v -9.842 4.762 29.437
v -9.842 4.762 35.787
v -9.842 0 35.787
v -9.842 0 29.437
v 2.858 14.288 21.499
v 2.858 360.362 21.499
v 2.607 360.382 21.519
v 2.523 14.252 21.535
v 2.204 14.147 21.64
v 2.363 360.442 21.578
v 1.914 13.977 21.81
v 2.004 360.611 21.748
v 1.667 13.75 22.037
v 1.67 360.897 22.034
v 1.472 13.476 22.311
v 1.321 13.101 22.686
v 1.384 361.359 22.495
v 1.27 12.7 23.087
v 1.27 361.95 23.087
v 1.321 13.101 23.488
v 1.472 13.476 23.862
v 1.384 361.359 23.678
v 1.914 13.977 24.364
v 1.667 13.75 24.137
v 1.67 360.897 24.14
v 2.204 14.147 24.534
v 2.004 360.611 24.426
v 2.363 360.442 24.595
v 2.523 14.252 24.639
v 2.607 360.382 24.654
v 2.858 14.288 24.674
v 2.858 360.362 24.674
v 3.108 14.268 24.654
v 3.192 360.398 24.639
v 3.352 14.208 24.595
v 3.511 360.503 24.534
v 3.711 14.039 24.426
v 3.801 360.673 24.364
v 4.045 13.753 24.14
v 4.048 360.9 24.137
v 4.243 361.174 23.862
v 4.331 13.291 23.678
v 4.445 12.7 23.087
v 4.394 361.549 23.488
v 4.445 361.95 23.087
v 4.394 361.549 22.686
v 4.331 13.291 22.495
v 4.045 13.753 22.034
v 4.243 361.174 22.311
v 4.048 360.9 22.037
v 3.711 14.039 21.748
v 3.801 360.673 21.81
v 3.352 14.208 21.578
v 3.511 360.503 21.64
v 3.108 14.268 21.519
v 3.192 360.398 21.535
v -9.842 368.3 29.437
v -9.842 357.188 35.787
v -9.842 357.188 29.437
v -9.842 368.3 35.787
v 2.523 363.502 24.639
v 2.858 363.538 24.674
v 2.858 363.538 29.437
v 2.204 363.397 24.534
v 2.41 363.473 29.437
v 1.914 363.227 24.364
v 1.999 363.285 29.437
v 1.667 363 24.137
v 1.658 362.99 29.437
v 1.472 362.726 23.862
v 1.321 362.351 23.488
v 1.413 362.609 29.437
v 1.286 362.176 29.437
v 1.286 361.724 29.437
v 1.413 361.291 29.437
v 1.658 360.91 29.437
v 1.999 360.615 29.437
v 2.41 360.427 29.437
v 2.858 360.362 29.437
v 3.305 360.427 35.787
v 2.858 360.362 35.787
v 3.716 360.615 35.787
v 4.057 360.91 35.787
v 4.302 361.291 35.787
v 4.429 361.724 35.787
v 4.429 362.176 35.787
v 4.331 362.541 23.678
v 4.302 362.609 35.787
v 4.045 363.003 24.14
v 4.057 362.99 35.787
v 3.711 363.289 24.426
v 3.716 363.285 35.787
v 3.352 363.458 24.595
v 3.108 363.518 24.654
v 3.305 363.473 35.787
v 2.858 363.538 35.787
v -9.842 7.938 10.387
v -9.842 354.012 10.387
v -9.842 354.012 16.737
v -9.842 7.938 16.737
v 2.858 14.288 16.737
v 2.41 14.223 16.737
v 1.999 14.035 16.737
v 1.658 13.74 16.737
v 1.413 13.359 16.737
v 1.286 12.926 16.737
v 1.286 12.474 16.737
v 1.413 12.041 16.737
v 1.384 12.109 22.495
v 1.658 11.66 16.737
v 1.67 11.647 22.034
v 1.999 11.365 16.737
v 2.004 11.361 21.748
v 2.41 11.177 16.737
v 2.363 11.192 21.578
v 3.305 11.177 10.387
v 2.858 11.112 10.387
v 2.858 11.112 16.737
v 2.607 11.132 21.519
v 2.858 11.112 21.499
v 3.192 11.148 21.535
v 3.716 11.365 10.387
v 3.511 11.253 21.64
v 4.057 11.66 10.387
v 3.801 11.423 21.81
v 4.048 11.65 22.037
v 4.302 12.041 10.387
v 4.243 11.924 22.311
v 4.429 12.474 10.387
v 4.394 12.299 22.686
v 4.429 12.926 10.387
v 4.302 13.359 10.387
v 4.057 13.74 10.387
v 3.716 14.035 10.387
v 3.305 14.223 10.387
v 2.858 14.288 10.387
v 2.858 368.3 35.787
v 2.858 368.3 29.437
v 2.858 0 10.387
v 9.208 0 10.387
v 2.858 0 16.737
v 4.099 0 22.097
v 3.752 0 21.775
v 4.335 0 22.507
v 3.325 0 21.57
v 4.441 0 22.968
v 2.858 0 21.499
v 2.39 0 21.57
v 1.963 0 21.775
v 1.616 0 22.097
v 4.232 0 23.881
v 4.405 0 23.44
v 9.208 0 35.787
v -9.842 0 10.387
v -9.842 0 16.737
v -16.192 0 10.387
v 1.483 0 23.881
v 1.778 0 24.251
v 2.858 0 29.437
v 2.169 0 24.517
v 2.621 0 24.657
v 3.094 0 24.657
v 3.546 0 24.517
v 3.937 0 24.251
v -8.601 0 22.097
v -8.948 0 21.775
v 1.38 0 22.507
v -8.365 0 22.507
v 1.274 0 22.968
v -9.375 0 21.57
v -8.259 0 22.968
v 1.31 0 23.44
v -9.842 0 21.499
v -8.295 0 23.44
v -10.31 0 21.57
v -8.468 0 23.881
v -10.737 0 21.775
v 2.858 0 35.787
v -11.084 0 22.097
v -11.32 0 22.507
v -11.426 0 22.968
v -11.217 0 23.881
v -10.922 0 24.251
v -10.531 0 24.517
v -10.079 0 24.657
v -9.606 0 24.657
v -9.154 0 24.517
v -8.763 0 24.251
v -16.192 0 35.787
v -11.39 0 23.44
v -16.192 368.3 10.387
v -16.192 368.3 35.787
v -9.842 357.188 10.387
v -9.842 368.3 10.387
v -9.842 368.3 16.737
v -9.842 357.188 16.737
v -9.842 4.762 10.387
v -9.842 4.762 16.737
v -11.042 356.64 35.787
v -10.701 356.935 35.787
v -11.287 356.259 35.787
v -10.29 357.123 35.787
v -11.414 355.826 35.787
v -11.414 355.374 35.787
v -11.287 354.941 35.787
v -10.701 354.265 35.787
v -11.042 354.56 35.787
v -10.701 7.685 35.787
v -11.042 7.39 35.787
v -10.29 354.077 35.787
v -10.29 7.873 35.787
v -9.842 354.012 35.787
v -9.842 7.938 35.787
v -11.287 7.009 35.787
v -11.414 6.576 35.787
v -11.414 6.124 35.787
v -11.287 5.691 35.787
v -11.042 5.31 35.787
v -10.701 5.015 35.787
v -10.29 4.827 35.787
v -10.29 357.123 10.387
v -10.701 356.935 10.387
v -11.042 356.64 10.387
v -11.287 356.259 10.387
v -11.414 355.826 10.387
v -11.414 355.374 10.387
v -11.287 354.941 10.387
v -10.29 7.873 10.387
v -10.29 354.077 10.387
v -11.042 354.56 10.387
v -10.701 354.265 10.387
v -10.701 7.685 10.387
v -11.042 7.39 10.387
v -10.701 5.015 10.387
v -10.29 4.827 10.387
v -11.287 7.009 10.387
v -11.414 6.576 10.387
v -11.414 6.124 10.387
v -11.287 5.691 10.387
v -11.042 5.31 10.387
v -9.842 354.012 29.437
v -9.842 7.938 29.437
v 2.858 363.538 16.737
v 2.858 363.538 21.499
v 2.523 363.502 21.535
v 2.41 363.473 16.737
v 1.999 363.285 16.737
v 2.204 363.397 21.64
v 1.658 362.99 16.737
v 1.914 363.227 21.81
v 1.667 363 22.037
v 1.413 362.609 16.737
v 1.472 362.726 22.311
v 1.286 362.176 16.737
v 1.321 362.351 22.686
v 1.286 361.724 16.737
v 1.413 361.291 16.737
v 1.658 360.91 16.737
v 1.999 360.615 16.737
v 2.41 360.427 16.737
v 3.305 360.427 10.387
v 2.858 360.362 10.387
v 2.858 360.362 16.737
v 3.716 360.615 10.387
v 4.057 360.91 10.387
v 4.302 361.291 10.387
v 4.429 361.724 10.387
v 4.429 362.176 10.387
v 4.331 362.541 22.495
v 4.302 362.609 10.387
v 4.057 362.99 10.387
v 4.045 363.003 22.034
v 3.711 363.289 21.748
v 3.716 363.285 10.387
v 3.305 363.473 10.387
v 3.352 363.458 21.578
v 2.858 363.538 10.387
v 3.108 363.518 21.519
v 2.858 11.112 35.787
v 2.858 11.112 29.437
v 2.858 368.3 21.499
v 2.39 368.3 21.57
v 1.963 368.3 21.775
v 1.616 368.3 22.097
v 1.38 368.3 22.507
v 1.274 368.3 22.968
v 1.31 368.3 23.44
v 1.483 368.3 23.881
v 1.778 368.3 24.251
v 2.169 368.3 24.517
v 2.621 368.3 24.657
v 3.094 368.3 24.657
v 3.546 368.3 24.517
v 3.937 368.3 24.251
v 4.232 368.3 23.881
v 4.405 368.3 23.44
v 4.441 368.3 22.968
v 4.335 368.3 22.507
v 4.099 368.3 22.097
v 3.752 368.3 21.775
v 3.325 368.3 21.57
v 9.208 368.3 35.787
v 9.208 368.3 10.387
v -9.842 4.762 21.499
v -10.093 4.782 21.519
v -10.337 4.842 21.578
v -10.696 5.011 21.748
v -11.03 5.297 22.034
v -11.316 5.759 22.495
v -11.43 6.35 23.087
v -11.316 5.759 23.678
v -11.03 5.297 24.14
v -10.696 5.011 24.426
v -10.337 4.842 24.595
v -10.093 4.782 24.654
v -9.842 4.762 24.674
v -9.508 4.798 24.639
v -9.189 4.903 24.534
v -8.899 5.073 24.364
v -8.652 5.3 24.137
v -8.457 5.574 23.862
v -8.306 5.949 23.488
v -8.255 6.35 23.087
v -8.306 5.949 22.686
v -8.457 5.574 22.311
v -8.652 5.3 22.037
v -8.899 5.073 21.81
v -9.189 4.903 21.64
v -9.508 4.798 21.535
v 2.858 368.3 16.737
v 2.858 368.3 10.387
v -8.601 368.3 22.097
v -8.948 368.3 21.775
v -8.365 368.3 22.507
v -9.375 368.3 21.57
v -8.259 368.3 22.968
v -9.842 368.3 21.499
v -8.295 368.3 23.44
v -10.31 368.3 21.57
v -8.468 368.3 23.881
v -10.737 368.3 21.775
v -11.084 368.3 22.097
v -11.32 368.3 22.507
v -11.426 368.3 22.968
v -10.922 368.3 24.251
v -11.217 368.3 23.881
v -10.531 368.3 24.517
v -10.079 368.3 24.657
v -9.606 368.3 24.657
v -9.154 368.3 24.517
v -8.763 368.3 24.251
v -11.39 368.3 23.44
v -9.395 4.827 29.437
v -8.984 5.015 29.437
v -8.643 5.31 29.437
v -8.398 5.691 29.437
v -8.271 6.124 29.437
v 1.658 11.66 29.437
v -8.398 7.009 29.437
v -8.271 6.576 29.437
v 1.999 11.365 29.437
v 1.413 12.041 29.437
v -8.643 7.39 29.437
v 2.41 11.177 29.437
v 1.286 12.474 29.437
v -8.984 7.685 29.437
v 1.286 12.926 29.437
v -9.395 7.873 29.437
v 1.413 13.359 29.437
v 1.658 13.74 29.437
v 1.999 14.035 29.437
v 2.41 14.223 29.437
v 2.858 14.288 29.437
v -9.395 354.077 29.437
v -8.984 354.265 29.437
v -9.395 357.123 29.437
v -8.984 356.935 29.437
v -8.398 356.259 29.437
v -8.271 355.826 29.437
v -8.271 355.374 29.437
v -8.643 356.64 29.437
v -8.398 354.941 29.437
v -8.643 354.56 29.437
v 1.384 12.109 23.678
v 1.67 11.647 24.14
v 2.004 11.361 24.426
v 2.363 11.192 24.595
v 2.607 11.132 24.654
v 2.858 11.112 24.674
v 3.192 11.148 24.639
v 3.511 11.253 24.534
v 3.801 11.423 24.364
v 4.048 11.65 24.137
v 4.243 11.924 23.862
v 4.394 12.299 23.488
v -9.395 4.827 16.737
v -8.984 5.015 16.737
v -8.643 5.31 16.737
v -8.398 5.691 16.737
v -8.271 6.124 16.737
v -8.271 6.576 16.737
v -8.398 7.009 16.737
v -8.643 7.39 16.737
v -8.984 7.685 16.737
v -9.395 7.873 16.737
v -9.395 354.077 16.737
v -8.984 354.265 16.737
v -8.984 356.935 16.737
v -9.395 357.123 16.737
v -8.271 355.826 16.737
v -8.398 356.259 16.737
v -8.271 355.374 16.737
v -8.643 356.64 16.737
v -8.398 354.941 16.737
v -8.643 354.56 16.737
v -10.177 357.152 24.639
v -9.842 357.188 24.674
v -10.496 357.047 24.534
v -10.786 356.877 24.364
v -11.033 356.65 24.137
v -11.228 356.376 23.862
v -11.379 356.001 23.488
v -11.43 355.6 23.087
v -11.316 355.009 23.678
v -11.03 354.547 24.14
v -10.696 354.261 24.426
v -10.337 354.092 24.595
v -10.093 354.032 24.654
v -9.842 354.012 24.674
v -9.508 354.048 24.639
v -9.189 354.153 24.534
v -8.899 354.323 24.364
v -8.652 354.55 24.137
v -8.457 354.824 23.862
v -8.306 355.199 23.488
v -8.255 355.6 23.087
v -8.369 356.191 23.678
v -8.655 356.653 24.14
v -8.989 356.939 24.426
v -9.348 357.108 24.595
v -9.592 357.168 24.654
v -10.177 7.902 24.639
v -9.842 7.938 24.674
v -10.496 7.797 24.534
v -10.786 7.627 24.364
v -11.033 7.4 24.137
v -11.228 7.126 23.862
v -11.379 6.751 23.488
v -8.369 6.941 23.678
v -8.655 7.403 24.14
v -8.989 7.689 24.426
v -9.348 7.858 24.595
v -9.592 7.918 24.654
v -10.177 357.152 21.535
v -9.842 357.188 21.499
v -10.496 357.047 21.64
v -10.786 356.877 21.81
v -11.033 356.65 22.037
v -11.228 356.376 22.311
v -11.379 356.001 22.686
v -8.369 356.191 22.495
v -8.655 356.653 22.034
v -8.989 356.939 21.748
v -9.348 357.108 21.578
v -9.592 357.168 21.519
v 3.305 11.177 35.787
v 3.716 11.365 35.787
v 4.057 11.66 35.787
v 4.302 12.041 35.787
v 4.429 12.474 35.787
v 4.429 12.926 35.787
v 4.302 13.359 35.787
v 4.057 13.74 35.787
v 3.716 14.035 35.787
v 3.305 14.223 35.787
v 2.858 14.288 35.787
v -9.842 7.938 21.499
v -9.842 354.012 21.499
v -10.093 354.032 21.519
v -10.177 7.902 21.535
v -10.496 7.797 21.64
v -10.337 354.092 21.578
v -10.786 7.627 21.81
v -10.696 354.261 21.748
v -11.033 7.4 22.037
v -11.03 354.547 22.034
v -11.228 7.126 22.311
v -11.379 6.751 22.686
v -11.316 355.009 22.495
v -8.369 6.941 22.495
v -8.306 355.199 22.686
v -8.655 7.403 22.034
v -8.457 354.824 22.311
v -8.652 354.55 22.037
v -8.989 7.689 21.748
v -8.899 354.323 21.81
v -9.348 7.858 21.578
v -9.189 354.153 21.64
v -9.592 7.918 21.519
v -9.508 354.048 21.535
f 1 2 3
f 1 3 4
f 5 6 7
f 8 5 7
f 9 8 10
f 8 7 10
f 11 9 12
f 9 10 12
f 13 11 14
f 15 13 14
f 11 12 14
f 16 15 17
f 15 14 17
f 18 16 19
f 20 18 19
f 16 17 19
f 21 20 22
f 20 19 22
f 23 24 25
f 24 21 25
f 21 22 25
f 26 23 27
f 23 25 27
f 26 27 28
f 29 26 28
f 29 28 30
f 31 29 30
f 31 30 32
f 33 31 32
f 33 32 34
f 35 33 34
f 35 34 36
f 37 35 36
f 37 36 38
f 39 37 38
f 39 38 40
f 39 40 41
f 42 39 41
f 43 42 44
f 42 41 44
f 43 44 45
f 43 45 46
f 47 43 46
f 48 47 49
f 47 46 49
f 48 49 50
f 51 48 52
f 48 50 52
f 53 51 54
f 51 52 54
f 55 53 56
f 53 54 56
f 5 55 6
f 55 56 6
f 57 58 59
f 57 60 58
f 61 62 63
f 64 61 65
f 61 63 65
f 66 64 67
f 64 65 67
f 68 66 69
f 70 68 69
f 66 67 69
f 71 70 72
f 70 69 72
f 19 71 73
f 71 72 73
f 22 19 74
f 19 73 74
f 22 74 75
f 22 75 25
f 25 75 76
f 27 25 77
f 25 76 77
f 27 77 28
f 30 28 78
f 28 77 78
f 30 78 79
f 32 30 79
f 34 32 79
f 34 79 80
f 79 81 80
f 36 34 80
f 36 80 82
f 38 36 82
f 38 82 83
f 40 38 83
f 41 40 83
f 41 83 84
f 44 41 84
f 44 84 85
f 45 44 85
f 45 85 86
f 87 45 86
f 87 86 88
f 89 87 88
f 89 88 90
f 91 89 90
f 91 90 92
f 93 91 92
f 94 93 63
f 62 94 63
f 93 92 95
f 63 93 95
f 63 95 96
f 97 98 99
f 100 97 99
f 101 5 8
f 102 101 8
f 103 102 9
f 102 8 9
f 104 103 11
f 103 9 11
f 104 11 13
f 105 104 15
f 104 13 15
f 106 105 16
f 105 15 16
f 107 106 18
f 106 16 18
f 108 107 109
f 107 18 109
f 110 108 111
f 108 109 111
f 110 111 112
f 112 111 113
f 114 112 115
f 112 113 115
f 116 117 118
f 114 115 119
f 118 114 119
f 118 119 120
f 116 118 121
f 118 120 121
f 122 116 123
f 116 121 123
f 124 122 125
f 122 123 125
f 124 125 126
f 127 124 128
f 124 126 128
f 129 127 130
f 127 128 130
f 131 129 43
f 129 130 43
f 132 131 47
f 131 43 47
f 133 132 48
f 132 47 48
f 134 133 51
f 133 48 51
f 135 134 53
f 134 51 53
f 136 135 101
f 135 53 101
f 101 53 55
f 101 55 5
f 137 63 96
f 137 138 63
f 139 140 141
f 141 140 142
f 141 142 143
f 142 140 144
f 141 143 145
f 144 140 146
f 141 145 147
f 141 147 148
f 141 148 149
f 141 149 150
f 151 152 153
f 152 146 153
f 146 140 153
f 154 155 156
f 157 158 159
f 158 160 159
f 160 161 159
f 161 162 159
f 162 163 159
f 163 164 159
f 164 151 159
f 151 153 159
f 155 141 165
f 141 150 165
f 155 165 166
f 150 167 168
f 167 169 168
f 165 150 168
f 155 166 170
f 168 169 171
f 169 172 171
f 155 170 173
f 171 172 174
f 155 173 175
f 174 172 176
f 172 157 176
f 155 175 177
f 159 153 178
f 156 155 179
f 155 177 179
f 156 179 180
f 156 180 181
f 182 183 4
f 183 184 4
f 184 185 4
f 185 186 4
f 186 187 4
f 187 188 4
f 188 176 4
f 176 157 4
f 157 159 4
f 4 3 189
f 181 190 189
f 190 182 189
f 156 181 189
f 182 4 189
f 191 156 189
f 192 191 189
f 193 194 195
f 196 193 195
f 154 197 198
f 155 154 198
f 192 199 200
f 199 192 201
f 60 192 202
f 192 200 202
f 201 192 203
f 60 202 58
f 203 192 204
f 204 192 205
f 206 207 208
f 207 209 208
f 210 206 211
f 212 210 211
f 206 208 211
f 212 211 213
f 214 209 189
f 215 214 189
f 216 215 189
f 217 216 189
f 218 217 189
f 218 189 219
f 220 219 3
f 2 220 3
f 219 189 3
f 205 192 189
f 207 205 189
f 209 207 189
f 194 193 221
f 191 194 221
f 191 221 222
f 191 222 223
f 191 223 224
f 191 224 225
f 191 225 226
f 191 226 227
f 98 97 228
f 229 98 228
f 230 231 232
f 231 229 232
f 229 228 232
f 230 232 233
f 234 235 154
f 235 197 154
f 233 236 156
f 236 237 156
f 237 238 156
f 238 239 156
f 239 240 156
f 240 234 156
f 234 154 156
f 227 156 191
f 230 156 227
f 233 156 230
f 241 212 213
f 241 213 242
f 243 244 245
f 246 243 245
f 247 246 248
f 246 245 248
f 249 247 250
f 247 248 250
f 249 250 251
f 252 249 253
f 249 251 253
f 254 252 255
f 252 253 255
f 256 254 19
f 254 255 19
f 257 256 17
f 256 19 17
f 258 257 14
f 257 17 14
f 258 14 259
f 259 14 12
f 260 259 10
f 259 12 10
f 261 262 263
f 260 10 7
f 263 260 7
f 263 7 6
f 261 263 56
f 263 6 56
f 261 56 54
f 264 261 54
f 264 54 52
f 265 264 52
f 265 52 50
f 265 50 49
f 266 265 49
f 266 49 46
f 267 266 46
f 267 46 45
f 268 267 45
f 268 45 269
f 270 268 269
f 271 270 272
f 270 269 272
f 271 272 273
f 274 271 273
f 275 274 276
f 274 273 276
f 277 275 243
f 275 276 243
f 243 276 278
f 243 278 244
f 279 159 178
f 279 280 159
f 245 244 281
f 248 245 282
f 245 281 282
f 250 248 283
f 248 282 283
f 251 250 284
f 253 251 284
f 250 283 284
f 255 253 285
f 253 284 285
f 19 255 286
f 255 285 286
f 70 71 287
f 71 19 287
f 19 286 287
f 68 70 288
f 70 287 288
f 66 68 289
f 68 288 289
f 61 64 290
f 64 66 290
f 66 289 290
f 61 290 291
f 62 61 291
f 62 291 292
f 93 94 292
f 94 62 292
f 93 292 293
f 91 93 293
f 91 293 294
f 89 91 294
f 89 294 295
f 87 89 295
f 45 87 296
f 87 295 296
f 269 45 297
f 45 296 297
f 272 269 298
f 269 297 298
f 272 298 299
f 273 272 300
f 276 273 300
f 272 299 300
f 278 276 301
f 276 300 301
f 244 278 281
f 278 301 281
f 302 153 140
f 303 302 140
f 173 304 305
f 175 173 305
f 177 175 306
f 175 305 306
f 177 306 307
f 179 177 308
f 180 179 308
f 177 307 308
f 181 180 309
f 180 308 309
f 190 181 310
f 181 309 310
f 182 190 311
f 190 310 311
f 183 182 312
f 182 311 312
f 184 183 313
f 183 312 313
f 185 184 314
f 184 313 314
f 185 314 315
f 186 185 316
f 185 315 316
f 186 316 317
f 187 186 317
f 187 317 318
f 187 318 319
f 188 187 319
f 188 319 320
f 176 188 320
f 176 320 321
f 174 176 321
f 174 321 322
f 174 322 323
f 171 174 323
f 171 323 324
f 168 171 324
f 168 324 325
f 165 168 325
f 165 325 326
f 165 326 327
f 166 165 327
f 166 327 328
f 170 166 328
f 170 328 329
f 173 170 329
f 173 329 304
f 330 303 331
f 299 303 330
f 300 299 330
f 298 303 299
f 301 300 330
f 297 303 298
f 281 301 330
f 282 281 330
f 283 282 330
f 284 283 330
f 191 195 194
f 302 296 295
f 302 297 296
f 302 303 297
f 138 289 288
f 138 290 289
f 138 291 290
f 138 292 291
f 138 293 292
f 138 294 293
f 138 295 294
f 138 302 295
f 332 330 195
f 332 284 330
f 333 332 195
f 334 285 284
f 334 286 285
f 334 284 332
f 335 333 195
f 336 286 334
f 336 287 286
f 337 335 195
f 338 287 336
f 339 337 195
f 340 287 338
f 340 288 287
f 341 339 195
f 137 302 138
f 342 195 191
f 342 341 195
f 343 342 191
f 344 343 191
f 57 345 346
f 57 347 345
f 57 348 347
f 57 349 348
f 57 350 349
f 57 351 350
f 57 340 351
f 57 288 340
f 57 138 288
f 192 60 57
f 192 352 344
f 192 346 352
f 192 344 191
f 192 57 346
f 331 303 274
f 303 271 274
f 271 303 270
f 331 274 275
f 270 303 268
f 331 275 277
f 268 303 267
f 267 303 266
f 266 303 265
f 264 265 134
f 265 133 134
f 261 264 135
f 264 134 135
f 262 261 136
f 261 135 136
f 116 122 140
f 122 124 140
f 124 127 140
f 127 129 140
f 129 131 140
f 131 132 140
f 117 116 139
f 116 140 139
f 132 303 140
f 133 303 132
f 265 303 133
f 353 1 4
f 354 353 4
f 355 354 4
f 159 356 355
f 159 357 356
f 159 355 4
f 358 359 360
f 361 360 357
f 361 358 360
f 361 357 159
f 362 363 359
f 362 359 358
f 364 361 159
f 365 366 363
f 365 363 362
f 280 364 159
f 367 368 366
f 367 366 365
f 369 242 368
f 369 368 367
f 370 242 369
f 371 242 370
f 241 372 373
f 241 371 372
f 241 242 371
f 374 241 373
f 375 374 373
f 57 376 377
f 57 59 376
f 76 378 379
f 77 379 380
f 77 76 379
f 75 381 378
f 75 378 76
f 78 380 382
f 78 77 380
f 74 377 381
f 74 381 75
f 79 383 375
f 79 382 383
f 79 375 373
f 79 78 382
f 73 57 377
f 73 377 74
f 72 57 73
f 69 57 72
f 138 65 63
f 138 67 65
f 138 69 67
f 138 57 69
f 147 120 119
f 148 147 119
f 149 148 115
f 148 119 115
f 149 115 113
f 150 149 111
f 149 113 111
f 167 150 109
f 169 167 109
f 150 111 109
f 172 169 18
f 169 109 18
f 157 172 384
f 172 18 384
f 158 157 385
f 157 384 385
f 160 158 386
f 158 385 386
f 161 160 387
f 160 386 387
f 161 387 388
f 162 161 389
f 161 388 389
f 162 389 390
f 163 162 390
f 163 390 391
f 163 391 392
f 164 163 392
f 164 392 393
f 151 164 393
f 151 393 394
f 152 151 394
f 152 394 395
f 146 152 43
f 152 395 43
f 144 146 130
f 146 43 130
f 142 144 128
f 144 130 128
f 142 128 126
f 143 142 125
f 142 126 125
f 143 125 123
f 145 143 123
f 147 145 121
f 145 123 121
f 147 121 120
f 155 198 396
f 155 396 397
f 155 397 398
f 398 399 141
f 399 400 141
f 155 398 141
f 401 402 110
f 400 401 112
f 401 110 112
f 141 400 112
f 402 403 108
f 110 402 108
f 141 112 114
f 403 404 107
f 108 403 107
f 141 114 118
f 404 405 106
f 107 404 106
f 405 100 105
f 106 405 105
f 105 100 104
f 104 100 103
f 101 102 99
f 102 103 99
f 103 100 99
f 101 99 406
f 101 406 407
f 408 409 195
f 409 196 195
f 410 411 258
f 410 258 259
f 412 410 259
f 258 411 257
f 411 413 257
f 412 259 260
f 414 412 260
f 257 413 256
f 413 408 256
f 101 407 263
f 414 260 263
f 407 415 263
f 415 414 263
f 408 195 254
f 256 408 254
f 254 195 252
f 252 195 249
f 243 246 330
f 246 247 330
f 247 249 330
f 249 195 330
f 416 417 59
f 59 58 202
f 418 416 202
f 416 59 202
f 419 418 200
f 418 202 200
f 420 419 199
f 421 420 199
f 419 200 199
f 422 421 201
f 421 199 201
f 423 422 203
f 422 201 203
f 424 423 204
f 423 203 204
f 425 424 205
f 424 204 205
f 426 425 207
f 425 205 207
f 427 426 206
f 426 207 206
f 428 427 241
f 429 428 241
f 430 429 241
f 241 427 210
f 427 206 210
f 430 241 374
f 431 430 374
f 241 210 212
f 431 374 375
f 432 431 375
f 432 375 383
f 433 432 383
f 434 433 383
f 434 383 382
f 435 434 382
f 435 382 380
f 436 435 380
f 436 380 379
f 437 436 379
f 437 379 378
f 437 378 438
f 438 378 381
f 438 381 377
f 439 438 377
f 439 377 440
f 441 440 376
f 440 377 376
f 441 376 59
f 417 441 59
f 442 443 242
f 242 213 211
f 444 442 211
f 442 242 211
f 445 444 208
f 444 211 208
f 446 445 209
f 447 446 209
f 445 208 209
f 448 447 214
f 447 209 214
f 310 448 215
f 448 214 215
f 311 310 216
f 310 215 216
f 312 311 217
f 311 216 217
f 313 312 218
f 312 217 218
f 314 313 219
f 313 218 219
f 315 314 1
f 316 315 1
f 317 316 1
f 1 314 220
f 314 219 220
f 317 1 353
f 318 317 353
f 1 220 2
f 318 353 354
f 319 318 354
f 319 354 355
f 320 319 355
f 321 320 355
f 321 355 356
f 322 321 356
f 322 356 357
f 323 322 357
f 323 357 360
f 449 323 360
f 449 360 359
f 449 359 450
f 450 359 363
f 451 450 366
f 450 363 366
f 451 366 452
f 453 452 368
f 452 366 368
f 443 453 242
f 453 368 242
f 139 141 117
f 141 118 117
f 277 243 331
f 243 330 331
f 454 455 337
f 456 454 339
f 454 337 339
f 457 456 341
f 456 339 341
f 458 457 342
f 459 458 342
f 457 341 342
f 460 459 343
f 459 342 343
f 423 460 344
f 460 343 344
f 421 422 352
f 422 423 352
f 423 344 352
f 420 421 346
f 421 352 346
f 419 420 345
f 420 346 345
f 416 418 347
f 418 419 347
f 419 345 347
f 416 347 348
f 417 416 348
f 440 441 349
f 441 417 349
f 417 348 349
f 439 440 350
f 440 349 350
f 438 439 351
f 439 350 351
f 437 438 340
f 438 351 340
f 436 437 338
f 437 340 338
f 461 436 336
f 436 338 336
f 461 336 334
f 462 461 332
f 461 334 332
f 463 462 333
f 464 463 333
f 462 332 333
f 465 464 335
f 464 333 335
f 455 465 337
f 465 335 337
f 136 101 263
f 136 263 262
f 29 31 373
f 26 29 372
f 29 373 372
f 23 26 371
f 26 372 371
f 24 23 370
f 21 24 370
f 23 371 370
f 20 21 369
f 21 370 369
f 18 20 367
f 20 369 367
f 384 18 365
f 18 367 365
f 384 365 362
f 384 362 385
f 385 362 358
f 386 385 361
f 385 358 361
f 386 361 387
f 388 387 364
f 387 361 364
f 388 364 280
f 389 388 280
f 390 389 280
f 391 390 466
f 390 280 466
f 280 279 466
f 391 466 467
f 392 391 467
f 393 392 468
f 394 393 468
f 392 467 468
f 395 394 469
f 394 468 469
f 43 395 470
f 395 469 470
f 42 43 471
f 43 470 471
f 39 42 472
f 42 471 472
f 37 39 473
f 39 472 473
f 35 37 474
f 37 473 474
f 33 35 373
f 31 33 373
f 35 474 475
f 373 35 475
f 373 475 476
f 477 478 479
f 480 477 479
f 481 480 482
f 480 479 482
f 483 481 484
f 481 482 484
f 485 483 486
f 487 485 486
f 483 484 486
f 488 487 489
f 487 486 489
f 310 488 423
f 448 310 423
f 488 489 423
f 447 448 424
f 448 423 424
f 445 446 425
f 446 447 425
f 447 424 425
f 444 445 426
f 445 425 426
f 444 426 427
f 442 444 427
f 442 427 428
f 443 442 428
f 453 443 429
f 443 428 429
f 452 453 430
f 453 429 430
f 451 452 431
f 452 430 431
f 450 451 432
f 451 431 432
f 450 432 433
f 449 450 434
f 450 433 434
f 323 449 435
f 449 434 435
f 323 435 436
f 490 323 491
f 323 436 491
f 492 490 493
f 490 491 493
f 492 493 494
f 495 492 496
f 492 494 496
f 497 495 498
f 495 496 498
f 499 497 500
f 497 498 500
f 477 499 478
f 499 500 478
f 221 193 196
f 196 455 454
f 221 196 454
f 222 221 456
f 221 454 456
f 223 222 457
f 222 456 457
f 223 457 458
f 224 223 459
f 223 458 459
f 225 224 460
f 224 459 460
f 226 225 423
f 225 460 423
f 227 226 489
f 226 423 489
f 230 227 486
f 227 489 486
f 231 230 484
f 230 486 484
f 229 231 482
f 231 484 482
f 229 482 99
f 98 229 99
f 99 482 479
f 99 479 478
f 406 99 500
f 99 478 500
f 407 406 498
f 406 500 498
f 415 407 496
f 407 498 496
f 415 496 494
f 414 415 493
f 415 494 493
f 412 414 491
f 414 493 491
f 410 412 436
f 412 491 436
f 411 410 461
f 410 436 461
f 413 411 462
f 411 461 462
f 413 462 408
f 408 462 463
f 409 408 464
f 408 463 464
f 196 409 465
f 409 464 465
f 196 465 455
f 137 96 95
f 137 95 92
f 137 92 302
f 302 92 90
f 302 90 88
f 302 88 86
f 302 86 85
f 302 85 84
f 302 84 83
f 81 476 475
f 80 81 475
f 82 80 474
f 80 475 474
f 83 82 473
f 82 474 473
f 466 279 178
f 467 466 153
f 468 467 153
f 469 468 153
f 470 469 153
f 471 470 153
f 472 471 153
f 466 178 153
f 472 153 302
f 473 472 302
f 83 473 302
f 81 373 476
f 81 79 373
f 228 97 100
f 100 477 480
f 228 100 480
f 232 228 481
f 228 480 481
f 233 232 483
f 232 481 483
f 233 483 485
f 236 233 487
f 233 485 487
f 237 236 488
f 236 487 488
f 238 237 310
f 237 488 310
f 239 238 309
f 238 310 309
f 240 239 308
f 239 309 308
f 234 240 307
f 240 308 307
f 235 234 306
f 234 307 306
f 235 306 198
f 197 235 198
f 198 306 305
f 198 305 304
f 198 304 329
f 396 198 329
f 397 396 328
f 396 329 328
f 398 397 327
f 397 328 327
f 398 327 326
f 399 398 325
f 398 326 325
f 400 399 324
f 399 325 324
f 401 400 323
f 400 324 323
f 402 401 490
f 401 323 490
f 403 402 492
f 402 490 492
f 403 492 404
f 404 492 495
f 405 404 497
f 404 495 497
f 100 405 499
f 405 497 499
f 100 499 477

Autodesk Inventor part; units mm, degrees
ref_plane "YZ Plane" through (0, 0, 0) normal (1, 0, 0) x (0, 1, 0)
ref_plane "XZ Plane" through (0, 0, 0) normal (0, 1, 0) x (-1, 0, 0)
ref_plane "XY Plane" through (0, 0, 0) normal (0, 0, 1) x (1, 0, 0)
sketch "Sketch1" plane through (0, 0, 0) normal (0, 1, 0) x (-1, 0, 0)
  line L0 (16.1925, 35.7868) -> (-9.2075, 35.7868)
  line L1 (-9.2075, 35.7868) -> (-9.2075, 10.3868)
  line L2 (-9.2075, 10.3868) -> (16.1925, 10.3868)
  line L3 (16.1925, 10.3868) -> (16.1925, 35.7868)
  point P0 (0, 0)
  dimension "d0" = 25.4
  dimension "d1" = 25.4
extrude "Extrusion1" add sketch "Sketch1" along normal blind 368.3
sketch "Sketch2" plane through (0, 368.3, 0) normal (0, 1, 0) x (1, 0, 0)
  line L0 (-9.8425, -16.7368) -> (2.8575, -16.7368)
  line L1 (2.8575, -16.7368) -> (2.8575, -1.003)
  line L2 (2.8575, -1.003) -> (-9.8425, -1.003)
  line L3 (-9.8425, -1.003) -> (-9.8425, -16.7368)
  line L4 (9.2075, -35.7868) -> (9.2075, -10.3868) projected
  line L5 (-16.1925, -10.3868) -> (-16.1925, -35.7868) projected
  line L6 (9.2075, -10.3868) -> (-16.1925, -10.3868) projected
  point P0 (0, 0)
  dimension "d4" = 6.35
  dimension "d5" = 6.35
  dimension "d6" = 6.35
extrude "Extrusion2" cut sketch "Sketch2" against normal blind 508
sketch "Sketch4" plane through (0, 368.3, 0) normal (0, 1, 0) x (1, 0, 0)
  line L0 (-9.8425, -29.4368) -> (2.8575, -29.4368)
  line L1 (2.8575, -29.4368) -> (2.8575, -45.8861)
  line L2 (2.8575, -45.8861) -> (-9.8425, -45.8861)
  line L3 (-9.8425, -45.8861) -> (-9.8425, -29.4368)
  line L4 (-16.1925, -10.3868) -> (-16.1925, -35.7868) projected
  line L5 (9.2075, -35.7868) -> (9.2075, -10.3868) projected
  line L6 (-16.1925, -35.7868) -> (9.2075, -35.7868) projected
  point P0 (0, 0)
  dimension "d20" = 6.35
  dimension "d21" = 6.35
  dimension "d22" = 6.35
extrude "Extrusion3" cut sketch "Sketch4" against normal blind 508
sketch "Sketch5" plane through (9.2075, 0, 10.3868) normal (0, 0, -1) x (-1, 0, 0)
  line L0 (0, 0) -> (6.35, 0) projected
  line L1 (0, 0) -> (0, 368.3) projected
  line L2 (25.4, 0) -> (25.4, 368.3) projected
  line L3 (19.05, 0) -> (25.4, 0) projected
  point P0 (9.2075, 0)
  point P1 (19.05, 6.35)
  point P2 (6.35, 12.7)
  dimension "d25" = 12.7
  dimension "d27" = 6.35
  dimension "d28" = 6.35
  dimension "d60" = 19.05
hole "Hole2" at (-9.8425, 6.35, 10.3868) at (2.8575, 12.7, 10.3868) direction (0, 0, 1) diameter 3.175 end through all
sketch "Sketch6" plane through (-16.1925, 0, 10.3868) normal (0, 0, -1) x (-1, 0, 0)
  line L0 (-6.35, 368.3) -> (-6.35, 7.9375) projected
  line L1 (-25.4, 368.3) -> (-19.05, 368.3) projected
  line L2 (-25.4, 0) -> (-25.4, 368.3) projected
  line L3 (-6.35, 368.3) -> (0, 368.3) projected
  line L4 (0, 0) -> (0, 368.3) projected
  point P0 (-16.1925, 0)
  point P1 (-19.05, 361.95)
  point P2 (-6.35, 355.6)
  dimension "d36" = 6.35
  dimension "d38" = 12.7
  dimension "d58" = 6.35
  dimension "d59" = 19.05
hole "Hole3" at (2.8575, 361.95, 10.3868) at (-9.8425, 355.6, 10.3868) direction (0, 0, 1) diameter 3.175 end through all
sketch "Sketch7" plane through (0, 0, 0) normal (0, -1, 0) x (1, 0, 0)
  line L0 (2.8575, 35.7868) -> (9.2075, 35.7868) projected
  line L1 (9.2075, 35.7868) -> (9.2075, 10.3868) projected
  line L2 (-16.1925, 10.3868) -> (-16.1925, 35.7868) projected
  line L3 (-16.1925, 35.7868) -> (-9.8425, 35.7868) projected
  point P0 (0, 0)
  point P1 (-9.8425, 23.0868)
  point P2 (2.8575, 23.0868)
  dimension "d47" = 12.7
  dimension "d48" = 6.35
  dimension "d49" = 6.35
  dimension "d50" = 12.7
hole "Hole4" at (-9.8425, 0, 23.0868) at (2.8575, 0, 23.0868) direction (0, 1, 0) diameter 3.175 end through all
properties part number "LeftSideElevator"
